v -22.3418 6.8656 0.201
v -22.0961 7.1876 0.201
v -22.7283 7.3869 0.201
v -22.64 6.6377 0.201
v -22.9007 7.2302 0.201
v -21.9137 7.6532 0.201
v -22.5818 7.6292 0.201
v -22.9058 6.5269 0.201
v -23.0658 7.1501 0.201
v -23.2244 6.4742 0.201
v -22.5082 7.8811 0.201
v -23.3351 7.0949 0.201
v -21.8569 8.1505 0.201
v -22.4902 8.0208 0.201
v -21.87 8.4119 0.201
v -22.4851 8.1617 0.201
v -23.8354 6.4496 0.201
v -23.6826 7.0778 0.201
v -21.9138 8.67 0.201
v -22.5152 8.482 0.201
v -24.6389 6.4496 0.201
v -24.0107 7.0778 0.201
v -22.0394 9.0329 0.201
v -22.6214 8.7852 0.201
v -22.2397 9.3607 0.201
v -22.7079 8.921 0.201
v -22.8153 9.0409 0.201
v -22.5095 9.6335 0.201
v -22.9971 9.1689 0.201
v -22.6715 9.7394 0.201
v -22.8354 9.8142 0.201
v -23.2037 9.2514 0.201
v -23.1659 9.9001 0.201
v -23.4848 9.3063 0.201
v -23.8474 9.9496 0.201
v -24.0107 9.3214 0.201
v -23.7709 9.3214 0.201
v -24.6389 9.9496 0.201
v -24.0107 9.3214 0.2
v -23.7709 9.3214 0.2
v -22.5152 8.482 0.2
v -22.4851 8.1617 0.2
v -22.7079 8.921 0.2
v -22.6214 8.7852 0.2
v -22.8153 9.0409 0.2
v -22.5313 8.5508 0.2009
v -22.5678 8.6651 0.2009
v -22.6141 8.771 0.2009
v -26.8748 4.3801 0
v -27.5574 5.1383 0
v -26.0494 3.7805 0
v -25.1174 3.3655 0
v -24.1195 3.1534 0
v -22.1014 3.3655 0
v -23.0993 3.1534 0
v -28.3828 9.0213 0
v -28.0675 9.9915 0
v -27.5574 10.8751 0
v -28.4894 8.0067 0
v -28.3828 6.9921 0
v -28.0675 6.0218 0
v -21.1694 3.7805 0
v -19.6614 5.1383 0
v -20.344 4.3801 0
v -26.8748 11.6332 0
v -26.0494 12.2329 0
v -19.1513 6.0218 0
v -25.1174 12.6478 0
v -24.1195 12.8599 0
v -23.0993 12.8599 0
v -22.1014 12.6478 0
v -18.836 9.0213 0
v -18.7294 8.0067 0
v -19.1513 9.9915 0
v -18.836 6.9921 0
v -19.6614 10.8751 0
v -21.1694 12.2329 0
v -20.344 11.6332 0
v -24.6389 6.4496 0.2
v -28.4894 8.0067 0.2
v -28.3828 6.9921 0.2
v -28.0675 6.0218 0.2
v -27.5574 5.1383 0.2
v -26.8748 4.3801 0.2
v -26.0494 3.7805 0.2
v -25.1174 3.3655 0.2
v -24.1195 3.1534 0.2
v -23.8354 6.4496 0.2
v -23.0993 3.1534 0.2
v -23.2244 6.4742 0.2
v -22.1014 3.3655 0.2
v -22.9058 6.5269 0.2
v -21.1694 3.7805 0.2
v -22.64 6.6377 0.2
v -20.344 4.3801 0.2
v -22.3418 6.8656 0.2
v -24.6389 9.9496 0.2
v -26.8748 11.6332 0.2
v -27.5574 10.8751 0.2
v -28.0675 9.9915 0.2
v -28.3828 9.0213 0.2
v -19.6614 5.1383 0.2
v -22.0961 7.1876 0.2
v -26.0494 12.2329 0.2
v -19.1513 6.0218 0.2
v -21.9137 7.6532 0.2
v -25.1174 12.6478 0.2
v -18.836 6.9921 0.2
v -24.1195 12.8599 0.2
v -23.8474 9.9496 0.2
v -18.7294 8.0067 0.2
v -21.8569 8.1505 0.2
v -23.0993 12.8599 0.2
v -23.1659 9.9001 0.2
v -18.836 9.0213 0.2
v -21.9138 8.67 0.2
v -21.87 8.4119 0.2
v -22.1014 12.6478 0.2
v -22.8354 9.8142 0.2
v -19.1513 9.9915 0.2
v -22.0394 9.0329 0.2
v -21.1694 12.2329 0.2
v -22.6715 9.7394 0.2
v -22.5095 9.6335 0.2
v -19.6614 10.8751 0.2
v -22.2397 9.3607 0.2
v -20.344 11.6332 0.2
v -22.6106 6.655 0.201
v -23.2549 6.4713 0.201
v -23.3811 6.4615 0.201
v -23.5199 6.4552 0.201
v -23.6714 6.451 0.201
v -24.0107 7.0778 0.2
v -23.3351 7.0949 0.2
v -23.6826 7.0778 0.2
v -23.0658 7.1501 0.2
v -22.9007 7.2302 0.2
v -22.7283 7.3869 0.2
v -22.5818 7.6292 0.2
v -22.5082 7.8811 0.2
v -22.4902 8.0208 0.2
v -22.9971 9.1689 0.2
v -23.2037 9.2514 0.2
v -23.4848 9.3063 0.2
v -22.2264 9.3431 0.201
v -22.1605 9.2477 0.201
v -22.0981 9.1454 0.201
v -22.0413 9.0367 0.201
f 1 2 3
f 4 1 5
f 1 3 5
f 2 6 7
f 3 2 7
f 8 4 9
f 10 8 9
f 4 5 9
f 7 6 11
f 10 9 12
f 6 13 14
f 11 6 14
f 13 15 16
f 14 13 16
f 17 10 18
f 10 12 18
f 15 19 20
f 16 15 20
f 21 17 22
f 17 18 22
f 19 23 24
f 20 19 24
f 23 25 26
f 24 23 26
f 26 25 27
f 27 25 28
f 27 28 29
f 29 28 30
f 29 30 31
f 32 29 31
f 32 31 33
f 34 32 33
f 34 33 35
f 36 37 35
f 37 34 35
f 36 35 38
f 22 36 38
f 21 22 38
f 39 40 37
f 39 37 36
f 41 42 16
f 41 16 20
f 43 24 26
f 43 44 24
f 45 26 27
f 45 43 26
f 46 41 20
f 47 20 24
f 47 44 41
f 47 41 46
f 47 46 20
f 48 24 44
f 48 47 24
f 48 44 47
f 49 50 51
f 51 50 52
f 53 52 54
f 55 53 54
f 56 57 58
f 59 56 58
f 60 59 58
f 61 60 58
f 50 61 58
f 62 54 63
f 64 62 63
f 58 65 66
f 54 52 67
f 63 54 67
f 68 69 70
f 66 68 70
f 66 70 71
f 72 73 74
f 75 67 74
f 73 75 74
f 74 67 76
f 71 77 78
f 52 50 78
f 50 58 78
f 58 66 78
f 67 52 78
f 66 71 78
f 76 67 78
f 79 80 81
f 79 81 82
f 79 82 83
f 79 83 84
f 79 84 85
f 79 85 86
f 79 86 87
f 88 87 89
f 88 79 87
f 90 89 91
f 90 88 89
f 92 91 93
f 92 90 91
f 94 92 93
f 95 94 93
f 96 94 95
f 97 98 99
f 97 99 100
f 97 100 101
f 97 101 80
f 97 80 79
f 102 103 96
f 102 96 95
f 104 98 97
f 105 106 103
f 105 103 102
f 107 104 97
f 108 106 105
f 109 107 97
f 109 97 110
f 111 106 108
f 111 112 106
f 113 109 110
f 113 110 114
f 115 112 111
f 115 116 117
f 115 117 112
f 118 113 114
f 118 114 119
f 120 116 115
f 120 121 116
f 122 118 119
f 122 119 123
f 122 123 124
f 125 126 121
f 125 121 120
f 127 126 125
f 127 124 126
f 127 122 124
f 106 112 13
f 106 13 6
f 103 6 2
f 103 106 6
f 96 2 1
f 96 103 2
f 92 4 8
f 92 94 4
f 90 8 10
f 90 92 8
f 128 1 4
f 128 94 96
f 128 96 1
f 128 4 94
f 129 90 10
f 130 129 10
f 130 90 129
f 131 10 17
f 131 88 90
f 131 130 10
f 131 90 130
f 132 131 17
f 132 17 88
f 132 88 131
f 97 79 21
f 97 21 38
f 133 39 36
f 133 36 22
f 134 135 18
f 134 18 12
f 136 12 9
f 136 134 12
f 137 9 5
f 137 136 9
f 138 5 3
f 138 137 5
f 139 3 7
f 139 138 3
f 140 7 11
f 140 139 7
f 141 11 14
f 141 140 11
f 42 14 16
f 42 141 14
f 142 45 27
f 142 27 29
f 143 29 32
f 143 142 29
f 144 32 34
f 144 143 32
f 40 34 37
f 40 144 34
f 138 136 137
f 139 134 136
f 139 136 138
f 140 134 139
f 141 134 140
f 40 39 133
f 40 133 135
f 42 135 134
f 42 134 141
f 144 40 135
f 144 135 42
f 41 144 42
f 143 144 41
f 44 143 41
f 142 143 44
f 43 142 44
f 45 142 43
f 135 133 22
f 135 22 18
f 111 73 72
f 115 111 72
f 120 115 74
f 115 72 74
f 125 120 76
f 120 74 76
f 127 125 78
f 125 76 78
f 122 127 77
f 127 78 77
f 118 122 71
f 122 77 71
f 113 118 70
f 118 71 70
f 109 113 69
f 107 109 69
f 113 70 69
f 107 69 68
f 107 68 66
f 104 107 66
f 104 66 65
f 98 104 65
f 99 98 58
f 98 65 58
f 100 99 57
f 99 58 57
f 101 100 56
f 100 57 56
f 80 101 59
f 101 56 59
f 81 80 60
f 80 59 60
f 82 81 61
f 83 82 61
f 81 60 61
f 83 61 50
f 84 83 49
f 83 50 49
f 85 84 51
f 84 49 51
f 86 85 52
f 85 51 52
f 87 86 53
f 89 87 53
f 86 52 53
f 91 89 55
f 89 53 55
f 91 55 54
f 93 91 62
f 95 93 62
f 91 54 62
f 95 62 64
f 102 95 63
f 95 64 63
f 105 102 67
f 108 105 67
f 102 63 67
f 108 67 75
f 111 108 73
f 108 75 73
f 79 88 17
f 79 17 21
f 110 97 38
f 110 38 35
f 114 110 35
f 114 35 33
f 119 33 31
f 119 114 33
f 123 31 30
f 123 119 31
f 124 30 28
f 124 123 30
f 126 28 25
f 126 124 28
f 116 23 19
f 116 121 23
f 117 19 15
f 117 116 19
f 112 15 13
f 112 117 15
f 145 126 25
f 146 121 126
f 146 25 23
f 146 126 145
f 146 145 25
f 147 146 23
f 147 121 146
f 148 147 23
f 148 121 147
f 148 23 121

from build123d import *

# Parameters (mm, degrees)
SKETCH1_R           = 4.88
BOSS_EXTRUDE1_DEPTH = 0.2
BOSS_EXTRUDE2_DEPTH = 0.001


with BuildPart() as part:
    # Sketch1 → Boss-Extrude1 (new body)
    with BuildSketch(Plane.XY):
        with Locations((-23.609402801, 8.006667037)):
            Circle(SKETCH1_R)
    extrude(amount=BOSS_EXTRUDE1_DEPTH)

    # Sketch2 → Boss-Extrude2 (add)
    with BuildSketch(Plane.XY.offset(0.2)):
        with BuildLine():
            Line((-24.638921092, 9.949558898), (-23.847354586, 9.949558898))
            add(Edge.make_bspline(
                [(-23.847354586, 9.949558898), (-23.785642872, 9.949127512), (-23.666353431, 9.948293638), (-23.493526632, 9.938897884), (-23.3328197, 9.92444788), (-23.184129043, 9.904569281), (-23.047759499, 9.878264451), (-22.923886914, 9.845270197), (-22.812095543, 9.80718382), (-22.711159616, 9.762367469), (-22.619014823, 9.710116054), (-22.531520401, 9.651912174), (-22.448848143, 9.585623648), (-22.369837876, 9.512529316), (-22.295509243, 9.431291939), (-22.224624407, 9.343257102), (-22.158918949, 9.247148179), (-22.096406736, 9.145269558), (-22.039872757, 9.037189487), (-21.990561709, 8.923827923), (-21.949253545, 8.805914387), (-21.915688522, 8.683323216), (-21.888933325, 8.556461375), (-21.870213253, 8.425072869), (-21.858640318, 8.28927934), (-21.857466341, 8.197245399), (-21.85686981, 8.150480373)],
                knots=[0, 0, 0, 0, 1.44355588, 2.790409838, 4.047694926, 5.217575253, 6.298404546, 7.294384826, 8.214239204, 9.058592145, 9.873746385, 10.689560431, 11.514393297, 12.350027578, 13.205127629, 14.088021785, 14.991911688, 15.926770944, 16.882954281, 17.842803888, 18.816321264, 19.80318086, 20.814351908, 21.847355356, 22.906180909, 24, 24, 24, 24], degree=3))
            add(Edge.make_bspline(
                [(-21.85686981, 8.150480373), (-21.85843185, 8.084491877), (-21.861506817, 7.954589661), (-21.88740862, 7.763959656), (-21.929300607, 7.581221782), (-21.988204545, 7.407805488), (-22.06122966, 7.245255069), (-22.148466338, 7.096437035), (-22.248635484, 6.962150166), (-22.360570124, 6.8430631), (-22.481768076, 6.740706152), (-22.607717189, 6.653044917), (-22.739644436, 6.583916719), (-22.855890777, 6.540079104), (-22.956690858, 6.5128159), (-23.045192238, 6.496703084), (-23.145720776, 6.481926659), (-23.259213813, 6.470507757), (-23.38517348, 6.460324902), (-23.524101853, 6.454791935), (-23.675549121, 6.45019486), (-23.780743569, 6.44977644), (-23.835435515, 6.449558898)],
                knots=[0, 0, 0, 0, 1.315458931, 2.589557908, 3.828601765, 5.048913369, 6.235739168, 7.376350998, 8.481830359, 9.569842114, 10.627874879, 11.640079404, 12.624025415, 13.590060155, 14.111227486, 14.704434459, 15.382649715, 16.137166398, 16.978595427, 17.902333227, 18.909396075, 20, 20, 20, 20], degree=3))
            Line((-23.835435515, 6.449558898), (-24.638921092, 6.449558898))
            Line((-24.638921092, 6.449558898), (-24.638921092, 9.949558898))
        make_face()
        with BuildLine():
            Line((-24.010715964, 9.32135377), (-24.010715964, 7.077764027))
            Line((-24.010715964, 7.077764027), (-23.682590964, 7.077764027))
            add(Edge.make_bspline(
                [(-23.682590964, 7.077764027), (-23.643549128, 7.077835567), (-23.568458681, 7.077973164), (-23.460045072, 7.084527018), (-23.359789974, 7.09110528), (-23.267969364, 7.103591041), (-23.183915, 7.1174993), (-23.10878157, 7.136854547), (-23.041020248, 7.157185594), (-22.981458724, 7.183069538), (-22.92690522, 7.212203639), (-22.876394908, 7.246337615), (-22.827638314, 7.284242109), (-22.781546984, 7.327031945), (-22.737946472, 7.374140505), (-22.697094746, 7.425810519), (-22.658446545, 7.48188434), (-22.622993894, 7.542658445), (-22.590597072, 7.607491044), (-22.56185746, 7.675754141), (-22.538028081, 7.748016219), (-22.518222561, 7.823600818), (-22.50406927, 7.903165988), (-22.492360122, 7.986122401), (-22.486323715, 8.072798724), (-22.485495256, 8.131776191), (-22.485074938, 8.161698321)],
                knots=[0, 0, 0, 0, 1.50275155, 2.890291501, 4.180787663, 5.369391935, 6.45668281, 7.458360028, 8.354766181, 9.177074746, 9.954075863, 10.732690366, 11.5210699, 12.329727389, 13.151100085, 13.990027547, 14.863562427, 15.770965086, 16.696477834, 17.652329173, 18.619756807, 19.62365428, 20.657822005, 21.729286259, 22.847956731, 24, 24, 24, 24], degree=3))
            add(Edge.make_bspline(
                [(-22.485074938, 8.161698321), (-22.485912068, 8.207551158), (-22.487544407, 8.296960637), (-22.503286326, 8.427187495), (-22.528911167, 8.54981559), (-22.565475347, 8.664389817), (-22.611565628, 8.77123219), (-22.66925836, 8.869437527), (-22.736070668, 8.960655544), (-22.788904019, 9.014166959), (-22.815303304, 9.040905052)],
                knots=[0, 0, 0, 0, 1.13821349, 2.219428113, 3.251817212, 4.244760574, 5.201143372, 6.134805572, 7.068016741, 8, 8, 8, 8], degree=3))
            add(Edge.make_bspline(
                [(-22.815303304, 9.040905052), (-22.841335498, 9.063689523), (-22.894503307, 9.110224223), (-22.987848507, 9.165984695), (-23.090710084, 9.214975736), (-23.205441201, 9.253820167), (-23.330933033, 9.284539999), (-23.467933013, 9.305726716), (-23.615707474, 9.319341076), (-23.718082178, 9.320668499), (-23.77093231, 9.32135377)],
                knots=[0, 0, 0, 0, 0.813307809, 1.661089106, 2.549956539, 3.493439533, 4.508053171, 5.589449661, 6.755572447, 8, 8, 8, 8], degree=3))
            Line((-23.77093231, 9.32135377), (-24.010715964, 9.32135377))
        make_face(mode=Mode.SUBTRACT)
    extrude(amount=BOSS_EXTRUDE2_DEPTH)


solid = part.part
